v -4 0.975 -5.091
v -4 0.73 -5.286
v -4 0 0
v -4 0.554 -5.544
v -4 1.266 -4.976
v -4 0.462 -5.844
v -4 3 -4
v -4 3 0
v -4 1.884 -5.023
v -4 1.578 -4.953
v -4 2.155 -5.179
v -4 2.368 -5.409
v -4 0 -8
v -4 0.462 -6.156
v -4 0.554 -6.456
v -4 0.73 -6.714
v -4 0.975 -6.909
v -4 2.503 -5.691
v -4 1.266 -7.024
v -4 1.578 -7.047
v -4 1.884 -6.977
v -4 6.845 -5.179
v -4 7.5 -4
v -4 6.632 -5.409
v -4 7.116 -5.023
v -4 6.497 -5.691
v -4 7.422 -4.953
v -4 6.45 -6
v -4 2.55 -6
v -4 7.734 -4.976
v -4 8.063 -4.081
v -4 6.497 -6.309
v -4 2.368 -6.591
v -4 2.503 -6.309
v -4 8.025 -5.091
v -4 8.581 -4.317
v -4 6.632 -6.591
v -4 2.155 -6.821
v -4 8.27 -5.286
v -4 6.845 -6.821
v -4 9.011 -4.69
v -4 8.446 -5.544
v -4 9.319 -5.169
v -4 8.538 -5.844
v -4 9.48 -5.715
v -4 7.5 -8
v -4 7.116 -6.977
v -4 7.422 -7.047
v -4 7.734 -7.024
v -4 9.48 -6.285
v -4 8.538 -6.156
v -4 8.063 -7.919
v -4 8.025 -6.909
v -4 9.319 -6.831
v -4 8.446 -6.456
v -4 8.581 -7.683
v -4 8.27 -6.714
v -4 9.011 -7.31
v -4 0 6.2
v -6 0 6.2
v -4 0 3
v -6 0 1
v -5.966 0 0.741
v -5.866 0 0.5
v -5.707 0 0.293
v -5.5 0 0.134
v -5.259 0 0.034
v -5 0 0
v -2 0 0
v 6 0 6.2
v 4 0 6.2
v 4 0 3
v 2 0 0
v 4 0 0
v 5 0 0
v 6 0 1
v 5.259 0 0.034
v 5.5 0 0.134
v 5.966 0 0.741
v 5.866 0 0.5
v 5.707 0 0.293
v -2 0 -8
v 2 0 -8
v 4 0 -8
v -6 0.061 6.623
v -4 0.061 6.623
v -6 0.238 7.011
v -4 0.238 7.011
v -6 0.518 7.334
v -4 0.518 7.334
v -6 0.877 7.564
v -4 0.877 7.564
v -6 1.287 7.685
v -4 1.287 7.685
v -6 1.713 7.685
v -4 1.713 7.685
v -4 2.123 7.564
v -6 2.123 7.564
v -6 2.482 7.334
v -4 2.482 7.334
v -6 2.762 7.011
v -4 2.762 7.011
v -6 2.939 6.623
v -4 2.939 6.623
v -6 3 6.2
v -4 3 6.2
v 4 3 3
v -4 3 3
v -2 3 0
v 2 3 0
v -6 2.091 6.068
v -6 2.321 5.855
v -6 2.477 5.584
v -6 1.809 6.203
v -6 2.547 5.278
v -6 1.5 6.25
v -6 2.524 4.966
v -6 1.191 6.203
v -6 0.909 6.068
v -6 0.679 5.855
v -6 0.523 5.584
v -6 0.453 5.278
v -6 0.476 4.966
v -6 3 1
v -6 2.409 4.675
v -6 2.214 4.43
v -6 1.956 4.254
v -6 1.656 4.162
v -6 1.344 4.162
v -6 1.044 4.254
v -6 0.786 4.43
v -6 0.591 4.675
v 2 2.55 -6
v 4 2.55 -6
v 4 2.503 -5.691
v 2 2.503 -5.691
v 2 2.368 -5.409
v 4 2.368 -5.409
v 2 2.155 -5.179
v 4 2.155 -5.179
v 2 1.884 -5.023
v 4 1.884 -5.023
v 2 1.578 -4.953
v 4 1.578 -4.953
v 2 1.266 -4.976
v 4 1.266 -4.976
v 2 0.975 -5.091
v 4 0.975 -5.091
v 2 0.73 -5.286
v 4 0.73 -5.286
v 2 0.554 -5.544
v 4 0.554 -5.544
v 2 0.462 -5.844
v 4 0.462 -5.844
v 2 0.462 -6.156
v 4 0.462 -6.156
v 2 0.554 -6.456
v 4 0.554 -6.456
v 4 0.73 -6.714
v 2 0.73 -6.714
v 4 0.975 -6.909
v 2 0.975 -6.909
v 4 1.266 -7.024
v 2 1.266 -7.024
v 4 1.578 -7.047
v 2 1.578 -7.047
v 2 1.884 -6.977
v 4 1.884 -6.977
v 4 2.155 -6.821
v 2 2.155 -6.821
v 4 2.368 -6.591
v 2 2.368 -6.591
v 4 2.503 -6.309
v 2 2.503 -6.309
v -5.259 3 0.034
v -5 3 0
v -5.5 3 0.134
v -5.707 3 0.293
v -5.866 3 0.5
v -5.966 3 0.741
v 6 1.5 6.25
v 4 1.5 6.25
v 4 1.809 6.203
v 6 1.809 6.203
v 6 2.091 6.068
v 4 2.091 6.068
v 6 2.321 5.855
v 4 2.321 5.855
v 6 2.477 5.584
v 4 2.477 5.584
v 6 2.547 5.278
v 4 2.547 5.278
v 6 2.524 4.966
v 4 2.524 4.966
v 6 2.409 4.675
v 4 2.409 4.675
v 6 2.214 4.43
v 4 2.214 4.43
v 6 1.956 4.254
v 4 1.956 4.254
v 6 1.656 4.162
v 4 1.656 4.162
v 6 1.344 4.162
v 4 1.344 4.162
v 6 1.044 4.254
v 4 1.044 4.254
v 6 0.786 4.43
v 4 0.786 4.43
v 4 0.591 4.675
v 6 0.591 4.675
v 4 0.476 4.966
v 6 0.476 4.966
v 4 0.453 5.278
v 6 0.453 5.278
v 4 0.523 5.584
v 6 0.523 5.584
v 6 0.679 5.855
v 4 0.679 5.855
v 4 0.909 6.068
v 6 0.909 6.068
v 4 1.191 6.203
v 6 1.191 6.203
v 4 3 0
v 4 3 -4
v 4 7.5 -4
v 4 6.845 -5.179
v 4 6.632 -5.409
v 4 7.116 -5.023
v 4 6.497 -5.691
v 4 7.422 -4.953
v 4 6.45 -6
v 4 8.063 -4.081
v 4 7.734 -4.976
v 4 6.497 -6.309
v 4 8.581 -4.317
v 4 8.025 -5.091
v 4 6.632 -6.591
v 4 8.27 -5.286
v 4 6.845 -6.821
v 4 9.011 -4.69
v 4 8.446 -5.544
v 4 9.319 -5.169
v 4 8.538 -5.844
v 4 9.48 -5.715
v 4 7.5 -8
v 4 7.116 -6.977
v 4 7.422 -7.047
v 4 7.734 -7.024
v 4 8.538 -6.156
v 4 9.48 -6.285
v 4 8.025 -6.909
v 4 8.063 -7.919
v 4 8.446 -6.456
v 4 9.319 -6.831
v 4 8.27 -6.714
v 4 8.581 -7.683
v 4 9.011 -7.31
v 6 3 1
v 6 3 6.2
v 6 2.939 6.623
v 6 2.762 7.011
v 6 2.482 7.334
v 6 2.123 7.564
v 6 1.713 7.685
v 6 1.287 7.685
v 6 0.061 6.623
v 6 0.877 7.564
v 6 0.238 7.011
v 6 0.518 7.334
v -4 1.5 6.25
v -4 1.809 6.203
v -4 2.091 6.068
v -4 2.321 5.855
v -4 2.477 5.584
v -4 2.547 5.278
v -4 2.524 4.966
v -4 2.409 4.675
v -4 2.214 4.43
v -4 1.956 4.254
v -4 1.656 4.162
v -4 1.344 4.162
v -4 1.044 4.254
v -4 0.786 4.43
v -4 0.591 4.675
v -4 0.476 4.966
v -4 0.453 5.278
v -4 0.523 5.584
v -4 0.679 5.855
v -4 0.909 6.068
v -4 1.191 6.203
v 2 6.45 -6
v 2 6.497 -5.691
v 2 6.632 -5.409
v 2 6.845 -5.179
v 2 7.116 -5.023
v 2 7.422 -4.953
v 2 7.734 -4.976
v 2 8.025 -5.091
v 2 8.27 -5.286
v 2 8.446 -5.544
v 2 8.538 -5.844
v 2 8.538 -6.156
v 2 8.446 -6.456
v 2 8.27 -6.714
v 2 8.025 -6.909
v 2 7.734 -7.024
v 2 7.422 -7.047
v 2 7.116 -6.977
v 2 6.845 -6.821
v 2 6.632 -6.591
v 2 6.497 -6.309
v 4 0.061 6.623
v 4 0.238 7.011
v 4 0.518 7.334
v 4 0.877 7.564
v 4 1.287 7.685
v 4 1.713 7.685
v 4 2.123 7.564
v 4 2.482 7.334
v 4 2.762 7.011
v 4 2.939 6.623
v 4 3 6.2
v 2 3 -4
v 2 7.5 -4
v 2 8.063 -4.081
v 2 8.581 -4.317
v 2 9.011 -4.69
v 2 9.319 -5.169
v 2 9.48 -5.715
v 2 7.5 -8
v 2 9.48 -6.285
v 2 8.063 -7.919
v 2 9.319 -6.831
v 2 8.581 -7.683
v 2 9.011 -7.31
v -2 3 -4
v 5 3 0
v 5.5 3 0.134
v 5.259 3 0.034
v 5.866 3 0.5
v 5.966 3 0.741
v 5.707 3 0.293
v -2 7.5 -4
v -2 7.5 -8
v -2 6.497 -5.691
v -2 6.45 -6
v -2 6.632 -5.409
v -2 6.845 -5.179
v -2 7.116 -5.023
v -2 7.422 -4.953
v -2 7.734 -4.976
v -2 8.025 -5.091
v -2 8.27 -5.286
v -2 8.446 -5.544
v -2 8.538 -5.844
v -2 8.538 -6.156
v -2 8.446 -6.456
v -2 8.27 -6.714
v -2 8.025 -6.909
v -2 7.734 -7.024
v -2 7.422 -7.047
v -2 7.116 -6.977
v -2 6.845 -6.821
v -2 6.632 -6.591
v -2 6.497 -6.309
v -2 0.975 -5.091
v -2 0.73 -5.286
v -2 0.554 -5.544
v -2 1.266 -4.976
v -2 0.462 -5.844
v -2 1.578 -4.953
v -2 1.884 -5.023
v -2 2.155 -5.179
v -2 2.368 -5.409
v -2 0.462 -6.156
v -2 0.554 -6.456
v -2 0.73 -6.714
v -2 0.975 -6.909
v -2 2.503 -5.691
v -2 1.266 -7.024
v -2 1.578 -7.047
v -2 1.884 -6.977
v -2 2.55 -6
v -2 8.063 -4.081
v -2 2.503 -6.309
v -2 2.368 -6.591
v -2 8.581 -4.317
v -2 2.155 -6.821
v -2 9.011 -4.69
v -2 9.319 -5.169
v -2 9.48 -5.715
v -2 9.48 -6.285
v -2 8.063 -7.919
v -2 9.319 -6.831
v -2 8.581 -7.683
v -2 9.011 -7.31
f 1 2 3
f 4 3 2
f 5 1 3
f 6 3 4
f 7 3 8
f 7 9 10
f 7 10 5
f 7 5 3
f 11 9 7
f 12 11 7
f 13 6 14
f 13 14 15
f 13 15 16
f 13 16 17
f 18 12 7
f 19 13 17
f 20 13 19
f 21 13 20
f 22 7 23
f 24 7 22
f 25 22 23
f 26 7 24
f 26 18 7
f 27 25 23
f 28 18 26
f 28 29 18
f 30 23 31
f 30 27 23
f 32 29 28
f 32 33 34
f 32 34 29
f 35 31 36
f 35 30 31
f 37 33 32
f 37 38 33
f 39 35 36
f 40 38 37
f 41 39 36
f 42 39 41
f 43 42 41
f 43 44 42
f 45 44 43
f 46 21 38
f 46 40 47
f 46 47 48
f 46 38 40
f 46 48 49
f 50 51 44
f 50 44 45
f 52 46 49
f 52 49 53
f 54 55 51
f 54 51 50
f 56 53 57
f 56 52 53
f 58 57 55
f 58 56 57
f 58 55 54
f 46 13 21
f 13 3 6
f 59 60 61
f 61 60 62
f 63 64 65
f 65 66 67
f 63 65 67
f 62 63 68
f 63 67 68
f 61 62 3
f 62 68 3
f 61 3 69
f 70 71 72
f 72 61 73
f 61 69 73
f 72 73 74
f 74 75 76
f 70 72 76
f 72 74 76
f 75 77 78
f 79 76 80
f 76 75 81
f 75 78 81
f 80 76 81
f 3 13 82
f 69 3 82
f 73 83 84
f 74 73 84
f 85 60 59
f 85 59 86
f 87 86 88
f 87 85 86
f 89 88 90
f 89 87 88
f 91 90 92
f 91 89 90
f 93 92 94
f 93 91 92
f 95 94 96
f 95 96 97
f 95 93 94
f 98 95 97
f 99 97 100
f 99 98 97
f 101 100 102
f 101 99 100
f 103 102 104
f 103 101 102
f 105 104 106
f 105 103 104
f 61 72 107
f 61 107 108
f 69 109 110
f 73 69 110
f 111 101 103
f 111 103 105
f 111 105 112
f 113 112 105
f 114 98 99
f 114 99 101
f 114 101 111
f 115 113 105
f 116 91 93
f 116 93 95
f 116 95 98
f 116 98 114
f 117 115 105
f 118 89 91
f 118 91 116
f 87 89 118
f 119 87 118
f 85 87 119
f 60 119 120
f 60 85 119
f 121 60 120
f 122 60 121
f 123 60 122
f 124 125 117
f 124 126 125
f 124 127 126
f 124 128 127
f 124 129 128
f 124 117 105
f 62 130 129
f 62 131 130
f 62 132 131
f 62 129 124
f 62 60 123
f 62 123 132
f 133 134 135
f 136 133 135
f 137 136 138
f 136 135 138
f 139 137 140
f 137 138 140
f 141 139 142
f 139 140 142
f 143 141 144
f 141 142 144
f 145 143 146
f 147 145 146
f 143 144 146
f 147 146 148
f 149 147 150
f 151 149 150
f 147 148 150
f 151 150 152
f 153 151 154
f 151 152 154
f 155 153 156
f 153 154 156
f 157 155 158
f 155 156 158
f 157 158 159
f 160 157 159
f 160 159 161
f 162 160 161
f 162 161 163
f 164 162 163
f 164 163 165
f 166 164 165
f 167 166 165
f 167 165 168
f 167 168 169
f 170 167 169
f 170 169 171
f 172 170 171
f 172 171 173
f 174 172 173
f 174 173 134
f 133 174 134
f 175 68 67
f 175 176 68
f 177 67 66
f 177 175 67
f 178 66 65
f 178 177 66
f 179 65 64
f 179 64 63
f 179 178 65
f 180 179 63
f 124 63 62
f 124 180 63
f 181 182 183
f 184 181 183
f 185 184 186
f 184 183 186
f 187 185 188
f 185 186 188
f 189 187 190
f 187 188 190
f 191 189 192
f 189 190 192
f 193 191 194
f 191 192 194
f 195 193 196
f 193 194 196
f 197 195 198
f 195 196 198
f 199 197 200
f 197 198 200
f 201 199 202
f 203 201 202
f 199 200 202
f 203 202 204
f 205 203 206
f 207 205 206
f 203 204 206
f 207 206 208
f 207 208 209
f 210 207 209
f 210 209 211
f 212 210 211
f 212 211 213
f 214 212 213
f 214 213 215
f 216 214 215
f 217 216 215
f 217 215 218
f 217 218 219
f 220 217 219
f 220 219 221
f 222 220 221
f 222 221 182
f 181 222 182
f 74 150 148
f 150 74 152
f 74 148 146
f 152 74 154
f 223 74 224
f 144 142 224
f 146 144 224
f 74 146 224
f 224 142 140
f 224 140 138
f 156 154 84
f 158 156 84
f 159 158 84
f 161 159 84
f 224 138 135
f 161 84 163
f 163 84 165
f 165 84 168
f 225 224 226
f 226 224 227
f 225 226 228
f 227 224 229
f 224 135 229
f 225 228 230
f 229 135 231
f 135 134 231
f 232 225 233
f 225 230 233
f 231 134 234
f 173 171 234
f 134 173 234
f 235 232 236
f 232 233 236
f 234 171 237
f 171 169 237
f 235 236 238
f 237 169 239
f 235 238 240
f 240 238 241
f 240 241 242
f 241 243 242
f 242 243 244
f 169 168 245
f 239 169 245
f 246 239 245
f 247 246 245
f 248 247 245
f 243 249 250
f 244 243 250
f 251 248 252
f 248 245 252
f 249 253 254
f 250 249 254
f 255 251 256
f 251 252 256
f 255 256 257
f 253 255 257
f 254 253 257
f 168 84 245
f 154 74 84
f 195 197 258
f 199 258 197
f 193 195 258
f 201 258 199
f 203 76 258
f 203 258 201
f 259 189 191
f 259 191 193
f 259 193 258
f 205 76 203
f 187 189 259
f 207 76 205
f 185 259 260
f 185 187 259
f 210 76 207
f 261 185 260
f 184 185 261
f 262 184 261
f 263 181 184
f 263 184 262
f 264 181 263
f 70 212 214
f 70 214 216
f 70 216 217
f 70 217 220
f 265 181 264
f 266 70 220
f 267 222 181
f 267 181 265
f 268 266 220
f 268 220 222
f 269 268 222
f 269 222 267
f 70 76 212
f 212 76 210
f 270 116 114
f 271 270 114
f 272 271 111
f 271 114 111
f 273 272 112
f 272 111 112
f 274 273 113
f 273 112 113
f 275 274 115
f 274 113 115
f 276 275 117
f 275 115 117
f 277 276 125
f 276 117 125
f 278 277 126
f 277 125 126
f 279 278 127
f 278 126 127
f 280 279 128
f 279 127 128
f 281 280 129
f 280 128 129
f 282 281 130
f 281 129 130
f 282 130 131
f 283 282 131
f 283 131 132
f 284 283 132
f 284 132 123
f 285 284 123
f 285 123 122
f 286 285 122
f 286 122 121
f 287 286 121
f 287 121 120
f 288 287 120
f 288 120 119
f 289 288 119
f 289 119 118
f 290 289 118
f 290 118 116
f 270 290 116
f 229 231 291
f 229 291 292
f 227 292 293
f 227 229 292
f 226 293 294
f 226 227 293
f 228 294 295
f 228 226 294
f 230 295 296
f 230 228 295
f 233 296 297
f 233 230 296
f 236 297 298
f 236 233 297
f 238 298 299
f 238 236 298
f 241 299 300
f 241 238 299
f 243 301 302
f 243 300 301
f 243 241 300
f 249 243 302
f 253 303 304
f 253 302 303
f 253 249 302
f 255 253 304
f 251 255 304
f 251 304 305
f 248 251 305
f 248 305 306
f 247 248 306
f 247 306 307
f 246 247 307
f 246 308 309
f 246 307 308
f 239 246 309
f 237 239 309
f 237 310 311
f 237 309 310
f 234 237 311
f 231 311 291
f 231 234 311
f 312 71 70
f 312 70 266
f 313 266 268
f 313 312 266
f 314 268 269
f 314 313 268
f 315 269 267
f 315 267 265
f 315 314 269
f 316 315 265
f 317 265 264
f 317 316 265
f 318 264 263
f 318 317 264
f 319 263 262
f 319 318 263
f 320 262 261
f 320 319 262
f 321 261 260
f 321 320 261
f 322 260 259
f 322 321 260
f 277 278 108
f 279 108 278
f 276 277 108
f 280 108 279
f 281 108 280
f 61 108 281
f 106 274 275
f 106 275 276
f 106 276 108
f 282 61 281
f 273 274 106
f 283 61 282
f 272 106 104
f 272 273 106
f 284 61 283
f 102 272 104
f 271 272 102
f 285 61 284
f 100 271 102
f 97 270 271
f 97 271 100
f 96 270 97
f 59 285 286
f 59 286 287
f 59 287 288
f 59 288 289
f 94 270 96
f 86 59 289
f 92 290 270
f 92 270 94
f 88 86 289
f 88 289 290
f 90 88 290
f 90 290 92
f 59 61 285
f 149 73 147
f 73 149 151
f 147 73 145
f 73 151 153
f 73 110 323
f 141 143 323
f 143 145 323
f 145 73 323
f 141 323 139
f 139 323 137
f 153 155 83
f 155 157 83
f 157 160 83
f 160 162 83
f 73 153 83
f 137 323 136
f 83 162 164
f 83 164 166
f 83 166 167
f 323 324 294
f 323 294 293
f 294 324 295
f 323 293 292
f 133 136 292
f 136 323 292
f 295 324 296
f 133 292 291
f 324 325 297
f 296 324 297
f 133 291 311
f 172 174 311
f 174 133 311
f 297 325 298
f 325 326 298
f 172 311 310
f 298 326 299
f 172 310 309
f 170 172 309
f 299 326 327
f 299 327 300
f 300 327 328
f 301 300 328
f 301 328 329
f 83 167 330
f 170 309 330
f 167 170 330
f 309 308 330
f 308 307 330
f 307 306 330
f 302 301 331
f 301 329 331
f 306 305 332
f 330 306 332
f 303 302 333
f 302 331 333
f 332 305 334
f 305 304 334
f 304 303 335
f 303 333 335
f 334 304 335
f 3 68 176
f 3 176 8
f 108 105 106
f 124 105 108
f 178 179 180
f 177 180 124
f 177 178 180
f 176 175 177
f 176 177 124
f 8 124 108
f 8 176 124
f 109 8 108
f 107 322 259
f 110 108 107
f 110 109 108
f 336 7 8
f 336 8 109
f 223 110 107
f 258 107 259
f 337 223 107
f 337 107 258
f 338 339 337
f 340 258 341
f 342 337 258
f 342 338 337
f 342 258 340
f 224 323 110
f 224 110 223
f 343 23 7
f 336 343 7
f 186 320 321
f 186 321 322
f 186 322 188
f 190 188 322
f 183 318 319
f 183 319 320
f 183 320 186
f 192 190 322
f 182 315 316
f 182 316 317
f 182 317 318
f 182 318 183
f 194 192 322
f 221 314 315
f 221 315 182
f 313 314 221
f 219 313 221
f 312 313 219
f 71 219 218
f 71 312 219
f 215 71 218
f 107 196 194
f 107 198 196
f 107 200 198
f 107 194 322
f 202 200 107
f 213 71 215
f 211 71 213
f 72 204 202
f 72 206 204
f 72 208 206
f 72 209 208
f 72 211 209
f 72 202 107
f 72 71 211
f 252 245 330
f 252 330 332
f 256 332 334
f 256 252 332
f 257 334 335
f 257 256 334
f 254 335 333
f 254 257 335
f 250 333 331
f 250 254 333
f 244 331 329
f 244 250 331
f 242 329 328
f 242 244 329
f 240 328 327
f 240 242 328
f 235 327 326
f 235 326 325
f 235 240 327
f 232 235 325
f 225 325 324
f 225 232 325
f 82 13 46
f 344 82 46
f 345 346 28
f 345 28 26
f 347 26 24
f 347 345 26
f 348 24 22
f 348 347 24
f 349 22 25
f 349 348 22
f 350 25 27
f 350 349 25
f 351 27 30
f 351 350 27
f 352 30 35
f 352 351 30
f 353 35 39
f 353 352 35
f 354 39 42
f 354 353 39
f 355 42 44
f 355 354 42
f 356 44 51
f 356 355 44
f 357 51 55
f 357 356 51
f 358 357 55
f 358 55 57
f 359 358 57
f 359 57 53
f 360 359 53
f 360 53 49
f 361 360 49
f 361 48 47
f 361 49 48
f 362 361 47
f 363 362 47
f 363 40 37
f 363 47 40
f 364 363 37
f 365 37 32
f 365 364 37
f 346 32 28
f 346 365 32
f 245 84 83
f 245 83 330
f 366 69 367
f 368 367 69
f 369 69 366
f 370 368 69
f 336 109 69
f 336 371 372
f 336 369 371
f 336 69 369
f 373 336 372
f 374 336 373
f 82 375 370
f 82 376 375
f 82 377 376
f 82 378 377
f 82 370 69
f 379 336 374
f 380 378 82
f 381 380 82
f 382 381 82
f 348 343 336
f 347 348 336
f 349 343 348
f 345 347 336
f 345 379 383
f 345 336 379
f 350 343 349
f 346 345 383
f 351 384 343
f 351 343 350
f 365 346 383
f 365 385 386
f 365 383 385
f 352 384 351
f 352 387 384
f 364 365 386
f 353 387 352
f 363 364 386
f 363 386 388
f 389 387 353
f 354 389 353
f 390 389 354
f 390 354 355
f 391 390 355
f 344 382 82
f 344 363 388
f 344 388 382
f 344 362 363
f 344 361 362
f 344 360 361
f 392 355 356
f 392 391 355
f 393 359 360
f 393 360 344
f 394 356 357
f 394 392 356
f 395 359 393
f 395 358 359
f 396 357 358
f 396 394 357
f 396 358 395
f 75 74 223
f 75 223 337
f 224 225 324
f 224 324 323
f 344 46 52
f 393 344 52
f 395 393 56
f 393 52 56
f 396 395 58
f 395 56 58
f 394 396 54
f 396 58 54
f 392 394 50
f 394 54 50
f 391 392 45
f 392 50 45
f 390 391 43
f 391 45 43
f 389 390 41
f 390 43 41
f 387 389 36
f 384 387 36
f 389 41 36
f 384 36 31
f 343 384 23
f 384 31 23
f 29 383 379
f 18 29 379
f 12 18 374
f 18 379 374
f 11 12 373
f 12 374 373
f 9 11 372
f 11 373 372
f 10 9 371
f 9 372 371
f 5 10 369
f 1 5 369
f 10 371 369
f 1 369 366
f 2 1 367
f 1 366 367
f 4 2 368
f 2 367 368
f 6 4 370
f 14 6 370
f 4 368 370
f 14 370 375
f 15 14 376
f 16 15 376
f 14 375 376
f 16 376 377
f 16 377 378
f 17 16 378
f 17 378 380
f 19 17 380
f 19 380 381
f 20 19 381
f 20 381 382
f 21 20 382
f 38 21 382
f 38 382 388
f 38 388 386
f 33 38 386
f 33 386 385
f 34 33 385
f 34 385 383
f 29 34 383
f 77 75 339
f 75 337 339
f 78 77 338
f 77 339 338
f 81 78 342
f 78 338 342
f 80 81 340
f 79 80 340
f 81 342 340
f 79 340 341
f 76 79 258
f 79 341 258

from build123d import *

# Parameters (mm, degrees)
EXTRUDE_1_DEPTH          = 3
SKETCH_2_OUTSIDE_W       = 13.724
SKETCH_2_OUTSIDE_H       = 8.024
CUT_EXTRUDE_1_DEPTH      = 12
SKETCH_3_R               = 1.05
CUT_EXTRUDE_2_DEPTH      = 12
FILLET_1_R               = 1
SKETCH_4_R               = 0.95
EXTRUDE_2_DEPTH          = 2
SKETCH_5_W               = 8
SKETCH_5_H               = 3
EXTRUDE_3_DEPTH          = 6
SKETCH_6_R               = 1.05
CUT_EXTRUDE_3_DEPTH      = 12
CUT_EXTRUDE_4_DEPTH      = 8
EXTRUDE_5_DEPTH          = 2
SKETCH_13_W              = 8
SKETCH_13_H              = 3
EXTRUDE_8_DEPTH          = 2
SKETCH_14_W              = 4
SKETCH_14_H              = 6
CUT_EXTRUDE_5_DEPTH      = 10
CUT_EXTRUDE_6_DEPTH      = 15.773286703
CUT_EXTRUDE_6_DEPTH_BACK = 15.773286703
SKETCH_11_R              = 1.05


with BuildPart() as part:
    # 草图1 → 凸台-拉伸1 (new body)
    with BuildSketch(Plane(origin=(0, 0, 0), x_dir=(1, 0, 0), z_dir=(0, 1, 0))):
        Polygon((-6, 0), (6, 0), (6, -8.7), (4, -8.7), (4, -3), (-4, -3), (-4, -8.7), (-6, -8.7), align=None)
    extrude(amount=EXTRUDE_1_DEPTH)

    # 草图2 outside → 切除-拉伸1 (cut)
    with BuildSketch(Plane.ZY.offset(6)):
        with Locations((4.35, 1.5)):
            Rectangle(SKETCH_2_OUTSIDE_W, SKETCH_2_OUTSIDE_H)
        with BuildLine():
            Line((6.2, 3), (0, 3))
            Line((0, 3), (0, 0))
            Line((0, 0), (6.2, 0))
            ThreePointArc((6.2, 0), (7.7, 1.5), (6.2, 3))
        make_face(mode=Mode.SUBTRACT)
    extrude(amount=-CUT_EXTRUDE_1_DEPTH, mode=Mode.SUBTRACT)

    # 草图3 → 切除-拉伸2 (cut)
    with BuildSketch(Plane.ZY.offset(6)):
        with Locations((5.2, 1.5)):
            Circle(SKETCH_3_R)
    extrude(amount=-CUT_EXTRUDE_2_DEPTH, mode=Mode.SUBTRACT)

    # 圆角1
    fillet_1_edges = [part.edges().sort_by_distance(p)[0] for p in [
        (-6, 1.5, 0),
        (6, 1.5, 0),
    ]]
    fillet(fillet_1_edges, radius=FILLET_1_R)

    # 草图4 → 凸台-拉伸2 (add)
    with BuildSketch(Plane(origin=(0, 0, 0), x_dir=(-1, 0, 0), z_dir=(0, 0, -1))):
        with Locations(Location((0, 1.5, 0), (0, 0, 180))):
            Circle(SKETCH_4_R)
    extrude(amount=EXTRUDE_2_DEPTH)

    # 草图5 → 凸台-拉伸3 (add)
    with BuildSketch(Plane(origin=(0, 0, -2), x_dir=(-1, 0, 0), z_dir=(0, 0, -1))):
        with Locations((0, 1.5)):
            Rectangle(SKETCH_5_W, SKETCH_5_H)
    extrude(amount=EXTRUDE_3_DEPTH)

    # 草图6 → 切除-拉伸3 (cut)
    with BuildSketch(Plane(origin=(4, 0, 0), x_dir=(0, 0, -1), z_dir=(1, 0, 0))):
        with Locations(Location((6, 1.5, 0), (0, 0, 90))):
            Circle(SKETCH_6_R)
    extrude(amount=-CUT_EXTRUDE_3_DEPTH, mode=Mode.SUBTRACT)

    # 草图8 → 切除-拉伸4 (cut)
    with BuildSketch(Plane(origin=(0, 3, 0), x_dir=(1, 0, 0), z_dir=(0, 1, 0))):
        Polygon((-1.5, 8), (1.5, 8), (2, 8), (2, 6), (1.5, 6), (-1.5, 6), (-2, 6), (-2, 8), align=None)
    extrude(amount=-CUT_EXTRUDE_4_DEPTH, mode=Mode.SUBTRACT)

    # 草图10 → 凸台-拉伸5 (add)
    with BuildSketch(Plane.ZY.offset(4)):
        with BuildLine():
            Line((-8, 3), (-8, 7.5))
            ThreePointArc((-8, 7.5), (-6, 9.5), (-4, 7.5))
            Line((-4, 7.5), (-4, 3))
            Line((-4, 3), (-8, 3))
        make_face()
    extrude_5 = extrude(amount=-EXTRUDE_5_DEPTH)

    # 镜向2: 凸台-拉伸5 across plane
    add(extrude_5.mirror(Plane(origin=(0, 0, 0), x_dir=(0, 0, 1), z_dir=(1, 0, 0))))

    # 草图13 → 凸台-拉伸8 (add)
    with BuildSketch(Plane.XY.offset(-2)):
        with Locations((0, 1.5)):
            Rectangle(SKETCH_13_W, SKETCH_13_H)
    extrude(amount=EXTRUDE_8_DEPTH)

    # 草图14 → 切除-拉伸5 (cut)
    with BuildSketch(Plane(origin=(0, 3, 0), x_dir=(1, 0, 0), z_dir=(0, 1, 0))):
        with Locations((0, 3)):
            Rectangle(SKETCH_14_W, SKETCH_14_H)
    extrude(amount=-CUT_EXTRUDE_5_DEPTH, mode=Mode.SUBTRACT)

    # 草图11 → 切除-拉伸6 (cut, two sides: drawn at the far end of the back side and taken through both)
    with BuildSketch(Plane.ZY.offset(2).offset(-CUT_EXTRUDE_6_DEPTH_BACK)):
        with Locations(Location((-6, 7.5, 0), (0, 0, 270))):
            Circle(SKETCH_11_R)
    extrude(amount=CUT_EXTRUDE_6_DEPTH + CUT_EXTRUDE_6_DEPTH_BACK, mode=Mode.SUBTRACT)


solid = part.part
